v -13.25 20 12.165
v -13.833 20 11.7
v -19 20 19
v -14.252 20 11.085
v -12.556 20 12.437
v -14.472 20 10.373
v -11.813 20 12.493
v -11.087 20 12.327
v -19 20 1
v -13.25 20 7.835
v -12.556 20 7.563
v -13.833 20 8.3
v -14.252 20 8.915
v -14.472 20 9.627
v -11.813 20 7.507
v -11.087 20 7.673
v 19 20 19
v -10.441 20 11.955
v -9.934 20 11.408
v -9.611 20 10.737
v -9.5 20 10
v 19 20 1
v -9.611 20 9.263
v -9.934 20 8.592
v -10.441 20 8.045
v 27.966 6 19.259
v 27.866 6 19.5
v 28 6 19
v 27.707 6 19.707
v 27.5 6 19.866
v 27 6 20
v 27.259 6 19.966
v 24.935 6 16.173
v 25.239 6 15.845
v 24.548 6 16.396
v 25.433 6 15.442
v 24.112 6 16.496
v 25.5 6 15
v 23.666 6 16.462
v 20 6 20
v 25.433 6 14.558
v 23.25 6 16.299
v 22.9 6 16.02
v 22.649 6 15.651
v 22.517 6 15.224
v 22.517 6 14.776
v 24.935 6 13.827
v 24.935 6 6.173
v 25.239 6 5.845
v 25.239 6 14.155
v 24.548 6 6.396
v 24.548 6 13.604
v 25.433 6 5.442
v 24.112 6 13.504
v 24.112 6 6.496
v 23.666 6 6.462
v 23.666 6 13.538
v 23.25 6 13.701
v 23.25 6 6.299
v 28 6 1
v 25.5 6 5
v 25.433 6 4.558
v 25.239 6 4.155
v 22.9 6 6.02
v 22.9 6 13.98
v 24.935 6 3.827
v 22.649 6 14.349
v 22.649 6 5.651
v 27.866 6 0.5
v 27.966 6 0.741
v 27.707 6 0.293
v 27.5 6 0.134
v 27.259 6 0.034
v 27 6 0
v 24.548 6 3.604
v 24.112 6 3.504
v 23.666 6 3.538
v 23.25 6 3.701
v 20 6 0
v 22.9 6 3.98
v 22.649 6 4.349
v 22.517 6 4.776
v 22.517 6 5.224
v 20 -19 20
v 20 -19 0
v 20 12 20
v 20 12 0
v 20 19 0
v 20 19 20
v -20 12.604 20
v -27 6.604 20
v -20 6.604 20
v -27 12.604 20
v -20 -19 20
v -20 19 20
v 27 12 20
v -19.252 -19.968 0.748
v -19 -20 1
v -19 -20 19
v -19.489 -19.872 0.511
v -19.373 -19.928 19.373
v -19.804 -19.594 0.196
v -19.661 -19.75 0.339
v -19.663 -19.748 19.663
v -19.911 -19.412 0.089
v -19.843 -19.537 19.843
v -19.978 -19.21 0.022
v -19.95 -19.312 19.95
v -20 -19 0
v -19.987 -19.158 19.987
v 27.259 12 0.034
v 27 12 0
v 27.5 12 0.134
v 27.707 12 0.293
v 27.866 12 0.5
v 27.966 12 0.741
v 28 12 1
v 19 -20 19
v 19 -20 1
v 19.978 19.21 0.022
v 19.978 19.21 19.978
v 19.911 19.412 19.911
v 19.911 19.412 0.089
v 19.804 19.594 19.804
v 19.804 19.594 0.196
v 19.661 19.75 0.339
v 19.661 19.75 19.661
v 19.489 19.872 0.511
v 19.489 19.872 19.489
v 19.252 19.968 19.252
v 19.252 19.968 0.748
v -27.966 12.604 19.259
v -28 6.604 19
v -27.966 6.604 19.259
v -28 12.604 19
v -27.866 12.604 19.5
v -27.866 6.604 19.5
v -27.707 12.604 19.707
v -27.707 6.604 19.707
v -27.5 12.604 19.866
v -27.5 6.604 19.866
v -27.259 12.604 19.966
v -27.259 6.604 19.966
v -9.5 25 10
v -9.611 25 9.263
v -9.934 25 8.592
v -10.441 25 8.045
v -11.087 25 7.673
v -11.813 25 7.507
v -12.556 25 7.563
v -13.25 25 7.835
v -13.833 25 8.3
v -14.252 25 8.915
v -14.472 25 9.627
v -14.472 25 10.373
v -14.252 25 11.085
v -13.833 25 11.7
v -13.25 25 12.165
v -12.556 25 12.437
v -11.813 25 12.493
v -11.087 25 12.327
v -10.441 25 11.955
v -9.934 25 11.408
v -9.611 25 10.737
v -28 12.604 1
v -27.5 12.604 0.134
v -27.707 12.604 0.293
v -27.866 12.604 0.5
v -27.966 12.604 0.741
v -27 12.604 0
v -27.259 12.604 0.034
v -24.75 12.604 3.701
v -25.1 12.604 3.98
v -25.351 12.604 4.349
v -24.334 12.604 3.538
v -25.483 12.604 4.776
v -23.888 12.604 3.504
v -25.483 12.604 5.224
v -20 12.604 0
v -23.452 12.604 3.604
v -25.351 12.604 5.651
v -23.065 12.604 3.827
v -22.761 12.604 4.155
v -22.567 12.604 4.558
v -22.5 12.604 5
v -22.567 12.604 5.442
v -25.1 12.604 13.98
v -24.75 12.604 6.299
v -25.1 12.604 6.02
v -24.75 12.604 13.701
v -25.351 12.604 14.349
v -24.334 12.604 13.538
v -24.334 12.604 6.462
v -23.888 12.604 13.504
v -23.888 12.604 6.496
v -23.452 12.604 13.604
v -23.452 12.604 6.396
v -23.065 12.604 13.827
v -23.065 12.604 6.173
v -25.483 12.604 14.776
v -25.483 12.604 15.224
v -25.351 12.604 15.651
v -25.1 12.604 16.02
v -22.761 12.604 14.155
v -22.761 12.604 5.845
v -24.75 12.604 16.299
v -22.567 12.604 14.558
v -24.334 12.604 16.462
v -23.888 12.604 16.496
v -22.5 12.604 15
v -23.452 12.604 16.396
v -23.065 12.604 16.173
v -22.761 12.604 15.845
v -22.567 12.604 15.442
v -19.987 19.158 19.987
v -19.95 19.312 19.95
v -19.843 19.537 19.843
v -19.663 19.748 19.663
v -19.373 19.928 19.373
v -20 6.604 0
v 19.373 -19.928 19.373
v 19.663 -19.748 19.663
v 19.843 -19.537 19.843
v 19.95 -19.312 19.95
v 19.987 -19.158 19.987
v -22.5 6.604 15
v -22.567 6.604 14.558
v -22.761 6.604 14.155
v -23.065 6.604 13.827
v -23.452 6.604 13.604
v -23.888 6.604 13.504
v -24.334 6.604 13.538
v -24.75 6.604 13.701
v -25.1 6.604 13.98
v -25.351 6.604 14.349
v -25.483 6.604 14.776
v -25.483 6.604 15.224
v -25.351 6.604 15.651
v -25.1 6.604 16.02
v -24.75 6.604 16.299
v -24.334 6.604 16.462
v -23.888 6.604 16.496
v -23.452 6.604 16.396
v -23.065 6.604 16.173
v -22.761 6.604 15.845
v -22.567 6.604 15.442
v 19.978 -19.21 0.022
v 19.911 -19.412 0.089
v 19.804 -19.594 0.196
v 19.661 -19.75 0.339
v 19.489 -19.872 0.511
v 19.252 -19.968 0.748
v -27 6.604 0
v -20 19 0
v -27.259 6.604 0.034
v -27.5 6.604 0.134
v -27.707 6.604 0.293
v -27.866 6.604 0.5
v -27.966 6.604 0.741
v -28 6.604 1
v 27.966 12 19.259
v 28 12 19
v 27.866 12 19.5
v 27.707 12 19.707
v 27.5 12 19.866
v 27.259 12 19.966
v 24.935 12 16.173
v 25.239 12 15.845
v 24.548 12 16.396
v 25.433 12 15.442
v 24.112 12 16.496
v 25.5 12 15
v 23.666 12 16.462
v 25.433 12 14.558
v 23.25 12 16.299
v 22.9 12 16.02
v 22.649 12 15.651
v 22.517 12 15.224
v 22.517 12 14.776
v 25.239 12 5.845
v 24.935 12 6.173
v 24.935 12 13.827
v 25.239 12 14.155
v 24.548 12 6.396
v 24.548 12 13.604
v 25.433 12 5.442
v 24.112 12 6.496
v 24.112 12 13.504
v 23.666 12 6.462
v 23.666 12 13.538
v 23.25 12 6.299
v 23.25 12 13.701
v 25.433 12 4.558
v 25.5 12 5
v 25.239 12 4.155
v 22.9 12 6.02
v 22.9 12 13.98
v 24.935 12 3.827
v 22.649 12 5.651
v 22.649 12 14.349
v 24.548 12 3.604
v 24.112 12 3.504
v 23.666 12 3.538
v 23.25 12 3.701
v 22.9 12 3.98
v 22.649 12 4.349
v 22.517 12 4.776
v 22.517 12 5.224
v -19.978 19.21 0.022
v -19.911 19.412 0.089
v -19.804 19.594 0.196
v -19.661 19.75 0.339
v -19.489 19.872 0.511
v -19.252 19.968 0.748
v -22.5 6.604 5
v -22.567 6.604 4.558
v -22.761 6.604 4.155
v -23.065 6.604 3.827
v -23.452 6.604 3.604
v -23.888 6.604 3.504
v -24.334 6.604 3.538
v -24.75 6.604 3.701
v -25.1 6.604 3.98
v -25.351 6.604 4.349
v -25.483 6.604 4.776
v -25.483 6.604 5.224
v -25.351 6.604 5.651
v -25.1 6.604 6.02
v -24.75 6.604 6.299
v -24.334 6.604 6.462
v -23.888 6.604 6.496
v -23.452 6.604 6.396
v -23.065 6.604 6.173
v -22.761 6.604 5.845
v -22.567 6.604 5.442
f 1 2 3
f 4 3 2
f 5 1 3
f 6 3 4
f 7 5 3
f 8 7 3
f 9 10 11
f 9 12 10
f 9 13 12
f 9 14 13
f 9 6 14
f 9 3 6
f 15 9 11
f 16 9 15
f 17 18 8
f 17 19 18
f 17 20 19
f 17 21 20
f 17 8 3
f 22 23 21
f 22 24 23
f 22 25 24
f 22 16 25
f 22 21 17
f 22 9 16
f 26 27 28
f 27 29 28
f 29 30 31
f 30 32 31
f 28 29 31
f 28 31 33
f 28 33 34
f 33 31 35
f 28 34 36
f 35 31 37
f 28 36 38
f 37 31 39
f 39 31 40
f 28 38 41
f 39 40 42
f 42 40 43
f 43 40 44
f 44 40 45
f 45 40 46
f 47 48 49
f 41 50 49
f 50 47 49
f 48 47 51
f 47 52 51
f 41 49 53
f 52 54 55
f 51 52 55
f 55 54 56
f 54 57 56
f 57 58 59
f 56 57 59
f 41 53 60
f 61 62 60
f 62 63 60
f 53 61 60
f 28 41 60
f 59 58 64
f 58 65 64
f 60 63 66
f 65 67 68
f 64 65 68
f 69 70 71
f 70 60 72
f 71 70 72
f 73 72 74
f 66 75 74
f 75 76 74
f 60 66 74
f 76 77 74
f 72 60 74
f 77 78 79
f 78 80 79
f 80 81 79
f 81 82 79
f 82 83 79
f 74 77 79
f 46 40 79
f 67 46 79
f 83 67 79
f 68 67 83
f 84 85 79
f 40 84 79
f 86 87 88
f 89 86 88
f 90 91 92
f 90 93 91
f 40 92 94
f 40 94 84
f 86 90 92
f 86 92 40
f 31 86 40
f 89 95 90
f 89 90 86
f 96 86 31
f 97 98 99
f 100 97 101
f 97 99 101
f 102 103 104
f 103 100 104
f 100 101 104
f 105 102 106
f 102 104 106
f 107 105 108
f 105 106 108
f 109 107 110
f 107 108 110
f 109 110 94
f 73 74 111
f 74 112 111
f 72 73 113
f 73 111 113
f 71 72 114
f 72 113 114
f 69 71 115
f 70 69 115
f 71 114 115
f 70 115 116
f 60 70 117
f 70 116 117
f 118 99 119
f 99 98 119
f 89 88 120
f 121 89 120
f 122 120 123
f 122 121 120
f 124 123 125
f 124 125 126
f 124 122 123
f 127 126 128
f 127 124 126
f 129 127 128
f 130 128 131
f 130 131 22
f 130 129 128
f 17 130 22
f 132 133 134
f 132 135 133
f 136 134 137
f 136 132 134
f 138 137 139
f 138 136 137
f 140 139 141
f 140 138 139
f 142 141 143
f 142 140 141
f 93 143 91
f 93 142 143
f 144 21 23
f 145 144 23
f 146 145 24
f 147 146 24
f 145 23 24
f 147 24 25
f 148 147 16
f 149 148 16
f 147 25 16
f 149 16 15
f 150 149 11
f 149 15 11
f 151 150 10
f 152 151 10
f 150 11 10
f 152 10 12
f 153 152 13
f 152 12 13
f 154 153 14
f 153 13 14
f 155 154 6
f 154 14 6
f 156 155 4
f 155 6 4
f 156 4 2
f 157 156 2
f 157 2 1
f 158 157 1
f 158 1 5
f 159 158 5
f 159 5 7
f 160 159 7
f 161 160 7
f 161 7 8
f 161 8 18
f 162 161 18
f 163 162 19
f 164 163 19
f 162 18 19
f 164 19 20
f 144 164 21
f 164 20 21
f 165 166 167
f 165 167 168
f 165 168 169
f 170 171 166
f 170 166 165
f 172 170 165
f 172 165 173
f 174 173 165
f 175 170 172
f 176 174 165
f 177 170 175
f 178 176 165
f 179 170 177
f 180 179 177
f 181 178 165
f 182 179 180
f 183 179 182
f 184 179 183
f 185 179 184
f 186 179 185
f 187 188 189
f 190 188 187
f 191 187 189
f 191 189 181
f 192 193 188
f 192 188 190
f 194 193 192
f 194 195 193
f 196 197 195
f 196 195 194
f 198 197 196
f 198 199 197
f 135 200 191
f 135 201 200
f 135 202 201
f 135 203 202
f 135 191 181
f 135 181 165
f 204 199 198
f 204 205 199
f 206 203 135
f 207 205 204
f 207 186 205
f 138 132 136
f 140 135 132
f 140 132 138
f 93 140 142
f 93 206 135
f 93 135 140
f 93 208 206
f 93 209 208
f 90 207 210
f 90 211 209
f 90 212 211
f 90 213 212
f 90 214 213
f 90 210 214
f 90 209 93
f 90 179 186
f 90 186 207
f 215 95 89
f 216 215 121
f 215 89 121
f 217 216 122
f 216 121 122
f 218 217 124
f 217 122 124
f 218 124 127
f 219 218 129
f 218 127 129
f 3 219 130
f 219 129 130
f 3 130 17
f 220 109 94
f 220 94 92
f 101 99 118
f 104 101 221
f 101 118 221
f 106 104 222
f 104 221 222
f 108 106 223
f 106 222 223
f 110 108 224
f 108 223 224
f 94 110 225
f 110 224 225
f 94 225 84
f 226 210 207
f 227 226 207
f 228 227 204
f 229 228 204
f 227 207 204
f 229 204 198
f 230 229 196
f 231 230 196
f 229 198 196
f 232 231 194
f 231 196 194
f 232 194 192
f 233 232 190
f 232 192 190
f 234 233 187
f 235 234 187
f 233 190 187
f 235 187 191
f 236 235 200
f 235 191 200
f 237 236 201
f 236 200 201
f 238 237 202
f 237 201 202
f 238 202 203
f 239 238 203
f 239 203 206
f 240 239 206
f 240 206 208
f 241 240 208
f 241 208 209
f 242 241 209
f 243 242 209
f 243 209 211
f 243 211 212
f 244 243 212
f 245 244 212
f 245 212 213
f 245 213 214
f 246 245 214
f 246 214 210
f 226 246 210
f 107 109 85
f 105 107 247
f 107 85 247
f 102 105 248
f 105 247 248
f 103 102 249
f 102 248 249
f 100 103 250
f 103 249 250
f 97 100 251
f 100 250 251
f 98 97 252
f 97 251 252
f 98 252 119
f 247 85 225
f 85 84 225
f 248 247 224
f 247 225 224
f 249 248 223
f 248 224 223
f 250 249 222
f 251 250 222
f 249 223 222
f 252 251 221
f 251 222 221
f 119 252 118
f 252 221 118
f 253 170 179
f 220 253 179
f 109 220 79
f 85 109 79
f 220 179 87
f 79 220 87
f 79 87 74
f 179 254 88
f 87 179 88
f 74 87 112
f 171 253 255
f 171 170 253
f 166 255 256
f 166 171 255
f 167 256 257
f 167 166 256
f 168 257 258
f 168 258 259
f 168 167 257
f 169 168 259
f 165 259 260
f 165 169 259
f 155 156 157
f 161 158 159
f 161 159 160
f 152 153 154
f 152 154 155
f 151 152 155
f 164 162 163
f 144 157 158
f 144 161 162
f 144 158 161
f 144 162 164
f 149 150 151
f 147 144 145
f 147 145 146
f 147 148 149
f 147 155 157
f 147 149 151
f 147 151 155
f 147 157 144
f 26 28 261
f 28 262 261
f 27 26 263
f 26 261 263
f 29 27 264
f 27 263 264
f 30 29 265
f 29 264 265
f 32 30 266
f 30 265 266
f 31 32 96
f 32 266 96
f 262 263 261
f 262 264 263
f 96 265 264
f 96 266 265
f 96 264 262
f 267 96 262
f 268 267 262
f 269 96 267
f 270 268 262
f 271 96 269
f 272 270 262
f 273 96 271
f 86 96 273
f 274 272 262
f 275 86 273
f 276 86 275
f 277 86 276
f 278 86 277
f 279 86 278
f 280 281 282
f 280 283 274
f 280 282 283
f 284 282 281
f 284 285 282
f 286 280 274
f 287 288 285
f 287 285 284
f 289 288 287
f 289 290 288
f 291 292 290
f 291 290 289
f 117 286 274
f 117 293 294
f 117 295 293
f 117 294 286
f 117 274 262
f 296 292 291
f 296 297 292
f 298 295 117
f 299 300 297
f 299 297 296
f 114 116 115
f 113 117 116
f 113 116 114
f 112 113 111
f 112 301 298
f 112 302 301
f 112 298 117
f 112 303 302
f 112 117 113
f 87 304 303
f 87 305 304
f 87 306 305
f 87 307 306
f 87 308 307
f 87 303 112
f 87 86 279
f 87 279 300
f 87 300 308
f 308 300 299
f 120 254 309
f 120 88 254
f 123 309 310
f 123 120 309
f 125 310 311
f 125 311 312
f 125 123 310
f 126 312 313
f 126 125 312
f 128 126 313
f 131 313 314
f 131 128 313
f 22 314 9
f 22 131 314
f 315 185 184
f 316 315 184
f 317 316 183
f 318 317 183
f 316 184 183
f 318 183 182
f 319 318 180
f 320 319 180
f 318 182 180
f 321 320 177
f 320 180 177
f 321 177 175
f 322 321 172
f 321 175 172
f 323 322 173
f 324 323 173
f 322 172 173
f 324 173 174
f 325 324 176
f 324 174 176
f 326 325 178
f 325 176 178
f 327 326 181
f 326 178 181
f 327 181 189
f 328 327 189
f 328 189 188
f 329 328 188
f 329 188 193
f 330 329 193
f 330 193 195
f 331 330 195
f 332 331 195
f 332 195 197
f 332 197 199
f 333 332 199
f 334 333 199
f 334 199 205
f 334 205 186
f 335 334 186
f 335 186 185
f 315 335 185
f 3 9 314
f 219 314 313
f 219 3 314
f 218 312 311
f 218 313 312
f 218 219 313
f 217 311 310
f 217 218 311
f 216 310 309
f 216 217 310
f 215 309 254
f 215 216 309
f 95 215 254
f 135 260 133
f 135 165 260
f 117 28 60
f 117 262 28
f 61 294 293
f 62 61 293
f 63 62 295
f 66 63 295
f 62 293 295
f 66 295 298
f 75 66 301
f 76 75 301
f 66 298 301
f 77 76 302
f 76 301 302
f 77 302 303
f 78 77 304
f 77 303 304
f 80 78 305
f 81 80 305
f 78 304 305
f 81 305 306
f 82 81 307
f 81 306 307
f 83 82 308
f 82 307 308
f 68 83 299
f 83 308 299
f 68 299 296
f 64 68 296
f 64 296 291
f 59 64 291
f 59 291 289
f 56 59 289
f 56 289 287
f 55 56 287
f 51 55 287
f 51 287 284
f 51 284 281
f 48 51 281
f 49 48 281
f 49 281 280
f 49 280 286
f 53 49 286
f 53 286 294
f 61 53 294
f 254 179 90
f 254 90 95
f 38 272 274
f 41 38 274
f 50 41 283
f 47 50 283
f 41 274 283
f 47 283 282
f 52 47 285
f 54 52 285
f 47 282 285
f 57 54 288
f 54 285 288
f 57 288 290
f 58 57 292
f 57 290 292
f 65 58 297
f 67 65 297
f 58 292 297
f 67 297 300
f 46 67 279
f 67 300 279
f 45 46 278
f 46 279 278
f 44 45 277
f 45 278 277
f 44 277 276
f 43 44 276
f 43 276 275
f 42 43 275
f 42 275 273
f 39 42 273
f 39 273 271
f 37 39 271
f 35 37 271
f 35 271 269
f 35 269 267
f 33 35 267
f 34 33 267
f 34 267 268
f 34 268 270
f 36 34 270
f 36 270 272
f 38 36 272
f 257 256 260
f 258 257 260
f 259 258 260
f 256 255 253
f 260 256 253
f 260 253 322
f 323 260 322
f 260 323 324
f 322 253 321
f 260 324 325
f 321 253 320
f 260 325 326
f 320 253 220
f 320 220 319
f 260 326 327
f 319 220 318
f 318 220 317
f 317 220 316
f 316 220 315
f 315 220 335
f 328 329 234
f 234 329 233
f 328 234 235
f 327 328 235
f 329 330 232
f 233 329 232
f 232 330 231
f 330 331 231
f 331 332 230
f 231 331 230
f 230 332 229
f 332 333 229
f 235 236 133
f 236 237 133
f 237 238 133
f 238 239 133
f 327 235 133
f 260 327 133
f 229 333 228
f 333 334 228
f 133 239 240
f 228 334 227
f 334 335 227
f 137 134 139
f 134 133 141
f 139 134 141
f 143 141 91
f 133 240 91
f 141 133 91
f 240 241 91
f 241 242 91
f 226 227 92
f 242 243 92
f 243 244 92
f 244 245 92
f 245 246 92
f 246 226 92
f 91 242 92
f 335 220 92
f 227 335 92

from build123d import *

# Parameters (mm, degrees)
IZIM1_W                     = 40
IZIM1_H                     = 40
Y_KSEKLIK_EKSTR_ZYON1_DEPTH = 20
IZIM2_W                     = 20
IZIM2_H                     = 6
Y_KSEKLIK_EKSTR_ZYON2_DEPTH = 8
IZIM3_W                     = 20
IZIM3_H                     = 6
Y_KSEKLIK_EKSTR_ZYON3_DEPTH = 8
IZIM4_R                     = 2.5
Y_KSEKLIK_EKSTR_ZYON4_DEPTH = 5
IZIM5_R                     = 1.5
KES_EKSTR_ZYON1_DEPTH       = 15
RADYUS1_R                   = 1
RADYUS2_R                   = 1
RADYUS3_R                   = 1
RADYUS4_R                   = 1
RADYUS5_R                   = 1


with BuildPart() as part:
    # Çizim1 → Yükseklik-Ekstrüzyon1 (new body)
    with BuildSketch(Plane.XY):
        Rectangle(IZIM1_W, IZIM1_H)
    extrude(amount=Y_KSEKLIK_EKSTR_ZYON1_DEPTH)

    # Çizim2 → Yükseklik-Ekstrüzyon2 (add)
    with BuildSketch(Plane(origin=(20, 0, 0), x_dir=(0, 0, -1), z_dir=(1, 0, 0))):
        with Locations((-10, 9)):
            Rectangle(IZIM2_W, IZIM2_H)
    extrude(amount=Y_KSEKLIK_EKSTR_ZYON2_DEPTH)

    # Çizim3 → Yükseklik-Ekstrüzyon3 (add)
    with BuildSketch(Plane.ZY.offset(20)):
        with Locations((10, 9.60422947)):
            Rectangle(IZIM3_W, IZIM3_H)
    extrude(amount=Y_KSEKLIK_EKSTR_ZYON3_DEPTH)

    # Çizim4 → Yükseklik-Ekstrüzyon4 (add)
    with BuildSketch(Plane(origin=(0, 20, 0), x_dir=(1, 0, 0), z_dir=(0, 1, 0))):
        with Locations((-12, -10)):
            Circle(IZIM4_R)
    extrude(amount=Y_KSEKLIK_EKSTR_ZYON4_DEPTH)

    # Çizim5 → Kes-Ekstrüzyon1 (cut)
    with BuildSketch(Plane(origin=(0, 12.60422947, 0), x_dir=(1, 0, 0), z_dir=(0, 1, 0))):
        with Locations((-24, -5)):
            Circle(IZIM5_R)
        with Locations((-24, -15)):
            Circle(IZIM5_R)
        with Locations((24, -15)):
            Circle(IZIM5_R)
        with Locations((24, -5)):
            Circle(IZIM5_R)
    extrude(amount=-KES_EKSTR_ZYON1_DEPTH, mode=Mode.SUBTRACT)

    # Radyus1
    radyus1_edges = [part.edges().sort_by_distance(p)[0] for p in [
        (0, 20, 0),
        (-20, 20, 10),
        (20, 20, 10),
        (0, 20, 20),
    ]]
    fillet(radyus1_edges, radius=RADYUS1_R)

    # Radyus2
    radyus2_edges = [part.edges().sort_by_distance(p)[0] for p in [
        (0, -20, 20),
        (0, -20, 0),
        (20, -20, 10),
        (-20, -20, 10),
    ]]
    fillet(radyus2_edges, radius=RADYUS2_R)

    # Radyus3
    radyus3_edges = [part.edges().sort_by_distance(p)[0] for p in [
        (28, 9, 20),
    ]]
    fillet(radyus3_edges, radius=RADYUS3_R)

    # Radyus4
    radyus4_edges = [part.edges().sort_by_distance(p)[0] for p in [
        (-28, 9.60422947, 0),
    ]]
    fillet(radyus4_edges, radius=RADYUS4_R)

    # Radyus5
    radyus5_edges = [part.edges().sort_by_distance(p)[0] for p in [
        (28, 9, 0),
        (-28, 9.60422947, 20),
    ]]
    fillet(radyus5_edges, radius=RADYUS5_R)


solid = part.part
